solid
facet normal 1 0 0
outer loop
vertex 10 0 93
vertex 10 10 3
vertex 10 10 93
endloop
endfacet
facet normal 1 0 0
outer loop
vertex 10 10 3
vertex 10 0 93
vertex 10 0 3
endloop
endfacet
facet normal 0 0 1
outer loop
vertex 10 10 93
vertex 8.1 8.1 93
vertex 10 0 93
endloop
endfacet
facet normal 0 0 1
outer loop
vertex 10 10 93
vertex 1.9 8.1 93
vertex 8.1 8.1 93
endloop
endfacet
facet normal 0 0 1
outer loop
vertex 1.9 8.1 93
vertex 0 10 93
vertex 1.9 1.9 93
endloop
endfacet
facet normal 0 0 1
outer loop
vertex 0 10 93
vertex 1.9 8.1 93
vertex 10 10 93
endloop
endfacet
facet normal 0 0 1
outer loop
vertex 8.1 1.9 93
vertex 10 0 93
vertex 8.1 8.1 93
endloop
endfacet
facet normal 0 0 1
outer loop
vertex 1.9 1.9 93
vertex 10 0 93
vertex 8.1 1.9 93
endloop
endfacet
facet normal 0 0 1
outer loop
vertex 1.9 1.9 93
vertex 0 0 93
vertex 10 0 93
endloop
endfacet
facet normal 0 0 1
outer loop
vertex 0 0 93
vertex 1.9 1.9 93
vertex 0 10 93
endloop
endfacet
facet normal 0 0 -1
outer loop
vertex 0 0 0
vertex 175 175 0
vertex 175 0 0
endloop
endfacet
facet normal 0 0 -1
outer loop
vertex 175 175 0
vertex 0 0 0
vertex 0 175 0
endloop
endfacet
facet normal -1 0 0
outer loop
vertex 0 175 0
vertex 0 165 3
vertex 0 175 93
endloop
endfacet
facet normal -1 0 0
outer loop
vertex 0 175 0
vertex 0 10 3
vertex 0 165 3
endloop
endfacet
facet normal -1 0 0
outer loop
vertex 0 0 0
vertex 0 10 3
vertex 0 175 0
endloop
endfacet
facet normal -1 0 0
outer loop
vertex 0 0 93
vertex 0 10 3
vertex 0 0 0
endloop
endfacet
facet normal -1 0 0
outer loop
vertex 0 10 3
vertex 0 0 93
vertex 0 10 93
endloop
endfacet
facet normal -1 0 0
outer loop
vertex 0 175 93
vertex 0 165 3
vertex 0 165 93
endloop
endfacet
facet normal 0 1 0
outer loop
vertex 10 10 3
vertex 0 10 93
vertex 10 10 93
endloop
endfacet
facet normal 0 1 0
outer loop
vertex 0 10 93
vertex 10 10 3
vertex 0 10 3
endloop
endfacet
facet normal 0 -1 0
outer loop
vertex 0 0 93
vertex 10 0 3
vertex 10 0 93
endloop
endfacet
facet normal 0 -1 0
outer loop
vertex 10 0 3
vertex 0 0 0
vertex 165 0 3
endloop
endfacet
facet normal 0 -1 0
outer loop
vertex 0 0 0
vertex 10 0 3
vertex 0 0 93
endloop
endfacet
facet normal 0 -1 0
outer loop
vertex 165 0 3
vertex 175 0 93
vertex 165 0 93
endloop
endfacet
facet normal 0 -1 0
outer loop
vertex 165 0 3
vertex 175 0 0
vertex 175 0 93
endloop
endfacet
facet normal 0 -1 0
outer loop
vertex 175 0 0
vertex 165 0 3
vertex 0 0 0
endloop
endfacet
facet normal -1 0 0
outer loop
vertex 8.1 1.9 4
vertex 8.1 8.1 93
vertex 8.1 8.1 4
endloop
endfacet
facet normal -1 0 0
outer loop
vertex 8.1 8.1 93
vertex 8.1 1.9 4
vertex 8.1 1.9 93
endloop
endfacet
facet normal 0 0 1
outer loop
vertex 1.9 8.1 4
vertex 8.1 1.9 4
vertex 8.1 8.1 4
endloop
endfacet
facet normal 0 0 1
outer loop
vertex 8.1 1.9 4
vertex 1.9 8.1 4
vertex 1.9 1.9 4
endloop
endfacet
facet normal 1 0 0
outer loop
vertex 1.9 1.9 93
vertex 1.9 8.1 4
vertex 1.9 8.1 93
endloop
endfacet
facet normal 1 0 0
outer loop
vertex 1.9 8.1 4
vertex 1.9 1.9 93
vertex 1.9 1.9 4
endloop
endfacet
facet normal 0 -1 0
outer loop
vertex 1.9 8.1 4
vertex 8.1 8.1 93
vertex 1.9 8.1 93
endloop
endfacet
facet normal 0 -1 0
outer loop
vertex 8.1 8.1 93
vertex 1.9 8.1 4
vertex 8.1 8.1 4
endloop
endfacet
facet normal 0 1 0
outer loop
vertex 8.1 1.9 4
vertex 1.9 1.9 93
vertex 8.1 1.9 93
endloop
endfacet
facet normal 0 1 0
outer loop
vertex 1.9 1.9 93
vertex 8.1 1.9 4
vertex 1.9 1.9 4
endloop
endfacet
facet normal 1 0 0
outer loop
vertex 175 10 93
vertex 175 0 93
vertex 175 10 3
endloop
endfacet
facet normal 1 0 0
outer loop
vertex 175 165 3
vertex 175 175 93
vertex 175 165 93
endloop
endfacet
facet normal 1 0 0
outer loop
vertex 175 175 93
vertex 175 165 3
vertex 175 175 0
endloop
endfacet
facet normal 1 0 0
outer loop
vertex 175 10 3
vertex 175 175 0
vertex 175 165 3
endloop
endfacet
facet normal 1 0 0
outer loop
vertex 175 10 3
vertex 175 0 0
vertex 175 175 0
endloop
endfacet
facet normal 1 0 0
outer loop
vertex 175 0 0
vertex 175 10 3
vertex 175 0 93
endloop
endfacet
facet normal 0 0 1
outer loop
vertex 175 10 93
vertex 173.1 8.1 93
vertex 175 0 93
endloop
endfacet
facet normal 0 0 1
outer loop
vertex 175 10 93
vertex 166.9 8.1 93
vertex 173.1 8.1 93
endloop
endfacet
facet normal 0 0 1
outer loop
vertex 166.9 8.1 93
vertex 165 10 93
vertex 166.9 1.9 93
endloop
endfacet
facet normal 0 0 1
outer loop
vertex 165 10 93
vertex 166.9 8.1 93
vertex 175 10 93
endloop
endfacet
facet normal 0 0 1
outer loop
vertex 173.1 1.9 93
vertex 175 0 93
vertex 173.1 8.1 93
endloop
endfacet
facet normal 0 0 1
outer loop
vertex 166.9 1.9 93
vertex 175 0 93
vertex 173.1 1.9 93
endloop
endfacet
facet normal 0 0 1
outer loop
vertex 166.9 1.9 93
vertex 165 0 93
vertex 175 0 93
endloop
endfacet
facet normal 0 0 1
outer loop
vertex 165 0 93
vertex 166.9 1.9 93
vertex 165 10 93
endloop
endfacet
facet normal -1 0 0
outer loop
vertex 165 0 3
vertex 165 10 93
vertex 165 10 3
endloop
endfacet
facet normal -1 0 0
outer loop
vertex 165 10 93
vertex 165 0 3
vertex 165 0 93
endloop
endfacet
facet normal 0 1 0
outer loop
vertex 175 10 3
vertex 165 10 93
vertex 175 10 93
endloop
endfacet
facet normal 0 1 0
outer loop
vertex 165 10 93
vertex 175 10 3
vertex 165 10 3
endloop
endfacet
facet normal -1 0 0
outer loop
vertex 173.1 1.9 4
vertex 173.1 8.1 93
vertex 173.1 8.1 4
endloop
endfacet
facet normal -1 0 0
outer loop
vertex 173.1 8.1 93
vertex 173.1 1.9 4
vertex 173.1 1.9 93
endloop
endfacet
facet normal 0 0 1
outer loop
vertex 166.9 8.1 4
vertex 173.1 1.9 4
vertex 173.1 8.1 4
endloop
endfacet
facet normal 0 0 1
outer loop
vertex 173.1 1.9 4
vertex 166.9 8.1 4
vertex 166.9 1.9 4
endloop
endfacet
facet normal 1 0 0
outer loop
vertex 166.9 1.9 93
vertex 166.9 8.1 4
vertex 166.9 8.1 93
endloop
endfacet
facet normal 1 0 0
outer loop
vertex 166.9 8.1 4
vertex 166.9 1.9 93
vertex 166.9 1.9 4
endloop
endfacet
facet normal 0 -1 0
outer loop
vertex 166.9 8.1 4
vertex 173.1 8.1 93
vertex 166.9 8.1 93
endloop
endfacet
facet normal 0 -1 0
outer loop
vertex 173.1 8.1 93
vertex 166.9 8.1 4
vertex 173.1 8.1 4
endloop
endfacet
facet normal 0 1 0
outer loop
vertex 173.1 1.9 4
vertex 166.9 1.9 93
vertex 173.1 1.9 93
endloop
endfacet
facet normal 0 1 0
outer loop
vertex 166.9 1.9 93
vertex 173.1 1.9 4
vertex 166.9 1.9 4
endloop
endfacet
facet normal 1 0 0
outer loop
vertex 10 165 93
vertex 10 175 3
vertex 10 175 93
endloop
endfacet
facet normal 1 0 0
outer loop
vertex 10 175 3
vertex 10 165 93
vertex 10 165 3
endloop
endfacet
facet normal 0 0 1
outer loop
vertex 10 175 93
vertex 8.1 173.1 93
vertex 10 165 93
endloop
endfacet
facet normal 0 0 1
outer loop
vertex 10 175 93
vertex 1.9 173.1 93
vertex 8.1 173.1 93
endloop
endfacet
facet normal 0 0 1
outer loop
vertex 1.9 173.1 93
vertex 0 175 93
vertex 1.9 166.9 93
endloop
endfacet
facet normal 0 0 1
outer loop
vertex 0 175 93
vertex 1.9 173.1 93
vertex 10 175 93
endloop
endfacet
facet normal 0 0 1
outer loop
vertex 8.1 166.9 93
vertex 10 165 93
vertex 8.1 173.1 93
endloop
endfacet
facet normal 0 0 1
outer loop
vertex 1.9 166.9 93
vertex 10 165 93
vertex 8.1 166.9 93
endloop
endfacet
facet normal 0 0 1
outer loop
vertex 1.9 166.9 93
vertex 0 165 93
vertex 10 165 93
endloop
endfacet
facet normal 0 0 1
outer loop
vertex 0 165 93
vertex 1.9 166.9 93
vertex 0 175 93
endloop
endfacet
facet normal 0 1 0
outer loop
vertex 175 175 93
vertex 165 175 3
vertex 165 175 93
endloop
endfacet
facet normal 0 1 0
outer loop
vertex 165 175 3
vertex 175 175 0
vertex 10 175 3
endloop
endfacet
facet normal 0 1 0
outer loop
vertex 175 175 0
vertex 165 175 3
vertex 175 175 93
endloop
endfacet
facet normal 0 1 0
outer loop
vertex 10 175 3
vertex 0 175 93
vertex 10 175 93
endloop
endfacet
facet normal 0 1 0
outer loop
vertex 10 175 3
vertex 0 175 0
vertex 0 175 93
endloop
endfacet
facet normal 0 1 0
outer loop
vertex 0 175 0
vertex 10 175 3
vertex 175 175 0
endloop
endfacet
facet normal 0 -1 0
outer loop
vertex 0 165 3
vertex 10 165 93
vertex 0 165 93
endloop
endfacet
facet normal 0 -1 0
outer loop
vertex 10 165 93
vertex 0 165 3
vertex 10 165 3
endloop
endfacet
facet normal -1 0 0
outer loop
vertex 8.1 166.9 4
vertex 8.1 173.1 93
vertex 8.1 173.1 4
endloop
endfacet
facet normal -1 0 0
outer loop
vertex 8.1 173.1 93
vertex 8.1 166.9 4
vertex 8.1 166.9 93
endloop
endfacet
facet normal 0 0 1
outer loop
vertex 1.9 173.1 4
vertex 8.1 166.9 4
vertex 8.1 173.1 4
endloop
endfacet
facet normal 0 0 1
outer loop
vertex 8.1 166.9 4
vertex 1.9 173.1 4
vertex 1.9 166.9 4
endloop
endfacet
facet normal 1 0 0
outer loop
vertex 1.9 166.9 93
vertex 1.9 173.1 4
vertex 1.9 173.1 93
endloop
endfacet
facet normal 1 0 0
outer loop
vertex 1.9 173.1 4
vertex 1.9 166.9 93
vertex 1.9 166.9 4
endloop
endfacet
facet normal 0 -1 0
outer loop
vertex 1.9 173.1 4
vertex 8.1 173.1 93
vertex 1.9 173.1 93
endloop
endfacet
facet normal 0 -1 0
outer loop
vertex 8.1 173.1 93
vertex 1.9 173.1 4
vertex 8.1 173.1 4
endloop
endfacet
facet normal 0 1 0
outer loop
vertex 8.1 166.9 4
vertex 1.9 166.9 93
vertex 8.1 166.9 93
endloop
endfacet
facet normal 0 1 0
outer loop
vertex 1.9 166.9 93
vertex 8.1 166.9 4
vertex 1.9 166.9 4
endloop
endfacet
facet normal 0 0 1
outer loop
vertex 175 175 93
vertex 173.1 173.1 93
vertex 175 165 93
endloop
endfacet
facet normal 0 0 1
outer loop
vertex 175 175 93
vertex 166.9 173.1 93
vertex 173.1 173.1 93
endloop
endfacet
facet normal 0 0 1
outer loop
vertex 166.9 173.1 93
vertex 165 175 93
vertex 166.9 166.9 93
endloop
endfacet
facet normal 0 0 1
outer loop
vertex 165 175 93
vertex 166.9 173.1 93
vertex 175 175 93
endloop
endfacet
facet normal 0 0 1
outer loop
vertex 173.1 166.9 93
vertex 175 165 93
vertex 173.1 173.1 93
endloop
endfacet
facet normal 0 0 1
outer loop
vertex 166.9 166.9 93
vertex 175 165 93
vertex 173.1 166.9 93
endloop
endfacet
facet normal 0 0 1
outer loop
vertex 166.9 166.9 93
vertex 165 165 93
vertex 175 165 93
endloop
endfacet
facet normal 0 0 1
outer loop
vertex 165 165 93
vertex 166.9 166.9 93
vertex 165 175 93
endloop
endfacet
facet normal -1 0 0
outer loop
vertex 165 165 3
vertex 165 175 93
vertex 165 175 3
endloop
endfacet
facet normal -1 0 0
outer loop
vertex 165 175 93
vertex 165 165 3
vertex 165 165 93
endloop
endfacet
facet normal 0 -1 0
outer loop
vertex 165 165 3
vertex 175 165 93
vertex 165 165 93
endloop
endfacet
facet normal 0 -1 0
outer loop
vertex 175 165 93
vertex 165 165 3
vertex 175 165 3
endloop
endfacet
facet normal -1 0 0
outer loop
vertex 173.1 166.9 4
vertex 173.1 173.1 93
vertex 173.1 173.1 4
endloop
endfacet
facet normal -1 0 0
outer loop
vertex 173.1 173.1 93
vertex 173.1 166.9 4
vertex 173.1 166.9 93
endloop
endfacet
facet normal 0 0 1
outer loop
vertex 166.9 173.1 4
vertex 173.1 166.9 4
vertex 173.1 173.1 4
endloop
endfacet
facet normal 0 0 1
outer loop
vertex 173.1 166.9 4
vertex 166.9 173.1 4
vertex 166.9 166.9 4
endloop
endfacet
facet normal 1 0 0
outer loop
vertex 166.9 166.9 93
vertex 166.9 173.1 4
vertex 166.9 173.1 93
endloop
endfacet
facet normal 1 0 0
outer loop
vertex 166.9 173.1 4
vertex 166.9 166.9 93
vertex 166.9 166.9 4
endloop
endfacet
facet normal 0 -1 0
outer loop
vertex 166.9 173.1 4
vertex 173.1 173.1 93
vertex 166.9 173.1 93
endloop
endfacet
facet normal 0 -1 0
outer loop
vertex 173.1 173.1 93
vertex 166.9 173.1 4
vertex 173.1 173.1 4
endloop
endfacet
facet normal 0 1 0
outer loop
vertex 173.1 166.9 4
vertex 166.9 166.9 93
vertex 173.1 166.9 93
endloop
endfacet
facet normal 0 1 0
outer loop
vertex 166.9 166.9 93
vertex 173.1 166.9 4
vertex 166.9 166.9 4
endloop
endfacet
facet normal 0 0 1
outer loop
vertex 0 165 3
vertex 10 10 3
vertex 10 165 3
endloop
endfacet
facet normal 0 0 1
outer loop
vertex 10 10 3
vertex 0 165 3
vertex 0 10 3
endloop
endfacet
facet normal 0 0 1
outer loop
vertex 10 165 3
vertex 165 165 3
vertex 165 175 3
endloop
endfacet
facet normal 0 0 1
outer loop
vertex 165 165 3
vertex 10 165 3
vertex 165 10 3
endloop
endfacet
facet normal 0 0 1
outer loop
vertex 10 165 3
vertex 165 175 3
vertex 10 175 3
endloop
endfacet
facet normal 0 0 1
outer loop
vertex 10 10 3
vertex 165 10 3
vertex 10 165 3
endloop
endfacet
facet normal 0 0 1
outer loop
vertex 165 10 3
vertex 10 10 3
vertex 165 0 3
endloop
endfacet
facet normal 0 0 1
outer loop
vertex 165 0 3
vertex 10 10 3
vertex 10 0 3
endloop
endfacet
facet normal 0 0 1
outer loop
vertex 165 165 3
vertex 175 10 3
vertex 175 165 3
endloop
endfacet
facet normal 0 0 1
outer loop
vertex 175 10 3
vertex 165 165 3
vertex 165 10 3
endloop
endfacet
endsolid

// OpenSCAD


insideWidth=155; 
insideLength=155;
insideHeight=90;


topThick=3; // thicknes of the top
pillarWidth=10; // width of the pillars

/*[Hidden]*/
pillarWallThick=1.9;
pillarInner = pillarWidth-(pillarWallThick*2);


outsideWidth=insideWidth+(pillarWidth*2); // insidewidth 150, outside width wil be 182 
outsideLength=insideLength+(pillarWidth*2);// as above - i.e 32mm wider outside than inside.



cube ([outsideLength, outsideWidth, topThick]); // baseplate

pillar();

translate([outsideLength-pillarWidth,0,0])
pillar(); // second corner suport

translate([0,outsideWidth-pillarWidth,0])
pillar(); // third corner suport

translate([outsideLength-pillarWidth,outsideWidth-pillarWidth,0])
pillar(); // fourth corner suport   




module pillar(){ // one to go in each corner
    difference(){
        cube ([pillarWidth,pillarWidth,insideHeight+topThick]);
            translate ([pillarWallThick,pillarWallThick,topThick+1])
                cube ([pillarInner,pillarInner,insideHeight]);

    } // end of difference
        
}// end of module pillar
